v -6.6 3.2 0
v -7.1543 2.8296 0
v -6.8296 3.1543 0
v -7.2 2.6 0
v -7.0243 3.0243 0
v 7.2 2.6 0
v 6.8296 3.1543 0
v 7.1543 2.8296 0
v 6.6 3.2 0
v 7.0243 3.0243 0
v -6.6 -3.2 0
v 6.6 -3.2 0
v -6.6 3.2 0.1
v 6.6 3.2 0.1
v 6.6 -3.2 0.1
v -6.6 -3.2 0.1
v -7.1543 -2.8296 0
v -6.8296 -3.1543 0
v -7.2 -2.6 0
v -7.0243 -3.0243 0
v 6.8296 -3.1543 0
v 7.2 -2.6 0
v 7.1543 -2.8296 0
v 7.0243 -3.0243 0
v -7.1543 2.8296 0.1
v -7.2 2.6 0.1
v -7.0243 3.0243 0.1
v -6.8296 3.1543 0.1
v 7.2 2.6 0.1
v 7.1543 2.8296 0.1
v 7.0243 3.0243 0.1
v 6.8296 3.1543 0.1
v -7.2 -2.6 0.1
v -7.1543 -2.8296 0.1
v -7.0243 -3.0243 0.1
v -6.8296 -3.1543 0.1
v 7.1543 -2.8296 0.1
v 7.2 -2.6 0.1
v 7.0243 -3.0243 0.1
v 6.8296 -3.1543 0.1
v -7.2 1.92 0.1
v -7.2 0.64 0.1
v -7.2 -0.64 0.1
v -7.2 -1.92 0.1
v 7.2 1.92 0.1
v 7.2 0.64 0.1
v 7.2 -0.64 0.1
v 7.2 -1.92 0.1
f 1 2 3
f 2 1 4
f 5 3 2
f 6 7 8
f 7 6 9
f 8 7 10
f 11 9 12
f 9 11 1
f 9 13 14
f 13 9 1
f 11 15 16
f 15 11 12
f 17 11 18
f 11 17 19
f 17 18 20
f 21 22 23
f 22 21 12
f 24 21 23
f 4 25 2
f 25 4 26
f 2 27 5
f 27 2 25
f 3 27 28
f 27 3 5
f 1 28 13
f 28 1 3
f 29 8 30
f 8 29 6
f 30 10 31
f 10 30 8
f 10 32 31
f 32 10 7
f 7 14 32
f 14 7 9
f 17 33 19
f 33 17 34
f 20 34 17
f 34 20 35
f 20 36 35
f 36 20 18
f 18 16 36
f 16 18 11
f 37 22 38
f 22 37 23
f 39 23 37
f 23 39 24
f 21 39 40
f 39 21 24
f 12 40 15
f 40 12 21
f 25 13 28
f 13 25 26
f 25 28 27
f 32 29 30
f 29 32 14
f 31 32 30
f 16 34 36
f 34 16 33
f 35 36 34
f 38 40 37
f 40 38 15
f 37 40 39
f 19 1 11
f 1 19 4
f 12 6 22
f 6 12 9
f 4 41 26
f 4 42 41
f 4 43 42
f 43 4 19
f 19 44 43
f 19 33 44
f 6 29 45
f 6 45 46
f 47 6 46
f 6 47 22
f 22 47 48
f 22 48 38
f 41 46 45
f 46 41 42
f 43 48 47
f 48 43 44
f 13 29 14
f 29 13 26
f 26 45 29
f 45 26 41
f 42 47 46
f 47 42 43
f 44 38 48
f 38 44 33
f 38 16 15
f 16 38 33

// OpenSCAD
// file: ../p/box3u12.scad
use <../lib.scad>
function ldraw_lib__box3u12() = [
// 0 Box with 3 Parallel Faces without Any Edges
// 0 Name: box3u12.dat
// 0 Author: J.C. Tchang [tchang]
// 0 !LDRAW_ORG Primitive UPDATE 2014-02
// 0 !LICENSE Licensed under CC BY 4.0 : see CAreadme.txt
// 
// 0 BFC CERTIFY CCW
  [0,"BFC","CERTIFY"],
  [0,"BFC","CCW"],
// 
// 0 !HISTORY 2014-12-23 [PTadmin] Official Update 2014-02
// 
// 
// 4 16 -1 1 1 1 1 1 1 1 -1 -1 1 -1
  [4,16,-1,1,1,1,1,1,1,1,-1,-1,1,-1],
// 4 16 -1 1 1 -1 0 1 1 0 1 1 1 1
  [4,16,-1,1,1,-1,0,1,1,0,1,1,1,1],
// 4 16 1 1 -1 1 0 -1 -1 0 -1 -1 1 -1
  [4,16,1,1,-1,1,0,-1,-1,0,-1,-1,1,-1],
];
module ldraw_lib__box3u12(step=0, col=false, unit=2/5, alt=false, line=0.2, solid=!$preview)
    makepoly(ldraw_lib__box3u12(), step=step, col=col, unit=unit, alt=alt, line=line, solid=solid);
ldraw_lib__box3u12(line=0.2);
// file: ../p/1-4cyli.scad
use <../lib.scad>
function ldraw_lib__1_4cyli() = [
// 0 Cylinder 0.25
// 0 Name: 1-4cyli.dat
// 0 Author: James Jessiman
// 0 !LDRAW_ORG Primitive UPDATE 2012-01
// 0 !LICENSE Licensed under CC BY 4.0 : see CAreadme.txt
// 
// 0 BFC CERTIFY CCW
  [0,"BFC","CERTIFY"],
  [0,"BFC","CCW"],
// 
// 0 !HISTORY 2002-03-23 [sbliss] Added BFC statement.
// 0 !HISTORY 2002-04-25 [PTadmin] Official Update 2002-02
// 0 !HISTORY 2007-06-22 [PTadmin] Header formatted for Contributor Agreement
// 0 !HISTORY 2008-07-01 [PTadmin] Official Update 2008-01
// 0 !HISTORY 2012-02-16 [Philo] Changed to CCW
// 0 !HISTORY 2012-03-30 [PTadmin] Official Update 2012-01
// 
// 
// 4 16 1 1 0 0.9239 1 0.3827 0.9239 0 0.3827 1 0 0
  [4,16,1,1,0,0.9239,1,0.3827,0.9239,0,0.3827,1,0,0],
// 5 24 1 0 0 1 1 0 0.9239 0 0.3827 1 0 -1
  [5,24,1,0,0,1,1,0,0.9239,0,0.3827,1,0,-1],
// 4 16 0.9239 1 0.3827 0.7071 1 0.7071 0.7071 0 0.7071 0.9239 0 0.3827
  [4,16,0.9239,1,0.3827,0.7071,1,0.7071,0.7071,0,0.7071,0.9239,0,0.3827],
// 5 24 0.9239 0 0.3827 0.9239 1 0.3827 0.7071 0 0.7071 1 0 0
  [5,24,0.9239,0,0.3827,0.9239,1,0.3827,0.7071,0,0.7071,1,0,0],
// 4 16 0.7071 1 0.7071 0.3827 1 0.9239 0.3827 0 0.9239 0.7071 0 0.7071
  [4,16,0.7071,1,0.7071,0.3827,1,0.9239,0.3827,0,0.9239,0.7071,0,0.7071],
// 5 24 0.7071 0 0.7071 0.7071 1 0.7071 0.3827 0 0.9239 0.9239 0 0.3827
  [5,24,0.7071,0,0.7071,0.7071,1,0.7071,0.3827,0,0.9239,0.9239,0,0.3827],
// 4 16 0.3827 1 0.9239 0 1 1 0 0 1 0.3827 0 0.9239
  [4,16,0.3827,1,0.9239,0,1,1,0,0,1,0.3827,0,0.9239],
// 5 24 0.3827 0 0.9239 0.3827 1 0.9239 0 0 1 0.7071 0 0.7071
  [5,24,0.3827,0,0.9239,0.3827,1,0.9239,0,0,1,0.7071,0,0.7071],
// 5 24 0 0 1 0 1 1 0.3827 0 0.9239 -1 0 1
  [5,24,0,0,1,0,1,1,0.3827,0,0.9239,-1,0,1],
];
module ldraw_lib__1_4cyli(step=0, col=false, unit=2/5, alt=false, line=0.2, solid=!$preview)
    makepoly(ldraw_lib__1_4cyli(), step=step, col=col, unit=unit, alt=alt, line=line, solid=solid);
ldraw_lib__1_4cyli(line=0.2);
// file: ../p/1-4chrd.scad
use <../lib.scad>
function ldraw_lib__1_4chrd() = [
// 0 Chord 0.25
// 0 Name: 1-4chrd.dat
// 0 Author: Max Martin Richter [MMR1988]
// 0 !LDRAW_ORG Primitive UPDATE 2023-05
// 0 !LICENSE Licensed under CC BY 4.0 : see CAreadme.txt
// 
// 0 BFC CERTIFY CCW
  [0,"BFC","CERTIFY"],
  [0,"BFC","CCW"],
// 
// 0 !HISTORY 2004-04-22 [PTadmin] Official Update 2004-02
// 0 !HISTORY 2007-10-09 [PTadmin] Header formatted for Contributor Agreement
// 0 !HISTORY 2008-07-01 [PTadmin] Official Update 2008-01
// 0 !HISTORY 2012-08-02 [MMR1988] Re-creation with PrimGen2 and Rectifier
// 0 !HISTORY 2012-08-09 [PTadmin] Official Update 2012-02
// 0 !HISTORY 2023-10-27 [OrionP] Change author to MMR1988 from hafhead
// 0 !HISTORY 2023-10-31 [OrionP] Official Update 2023-05
// 
// 4 16 0.9239 0 0.3827 0.3827 0 0.9239 0 0 1 1 0 0
  [4,16,0.9239,0,0.3827,0.3827,0,0.9239,0,0,1,1,0,0],
// 3 16 0.7071 0 0.7071 0.3827 0 0.9239 0.9239 0 0.3827
  [3,16,0.7071,0,0.7071,0.3827,0,0.9239,0.9239,0,0.3827],
];
module ldraw_lib__1_4chrd(step=0, col=false, unit=2/5, alt=false, line=0.2, solid=!$preview)
    makepoly(ldraw_lib__1_4chrd(), step=step, col=col, unit=unit, alt=alt, line=line, solid=solid);
ldraw_lib__1_4chrd(line=0.2);
// main file
use <../lib.scad>
use <../p/1-4chrd.scad>
use <../p/1-4cyli.scad>
use <../p/box3u12.scad>
function ldraw_lib__6148328af() = [
// 0 Sticker  0.8 x  1.8 with White Stripes on Red Background
// 0 Name: 6148328af.dat
// 0 Author: Massimo Maso [Sirio]
// 0 !LDRAW_ORG Part UPDATE 2024-08
// 0 !LICENSE Licensed under CC BY 4.0 : see CAreadme.txt
// 
// 0 BFC CERTIFY CCW
  [0,"BFC","CERTIFY"],
  [0,"BFC","CCW"],
// 
// 0 !KEYWORDS 917K, Bricklink 75876stk01, Brickowl 852010, Pit Lane, Porsche
// 0 !KEYWORDS Rebrickable 26357, set 75876, Speed Champions
// 
// 0 !HISTORY 2024-09-30 [OrionP] Official Update 2024-08
// 
// 
// 0 // Primitives
// 
// 1 16 -16.5 0 6.5 -1.5 0 0 0 -1 0 0 0 1.5 1-4chrd.dat
  [1,16,-16.5,0,6.5,-1.5,0,0,0,-1,0,0,0,1.5, ldraw_lib__1_4chrd()],
// 1 16 16.5 0 6.5 1.5 0 0 0 -1 0 0 0 1.5 1-4chrd.dat
  [1,16,16.5,0,6.5,1.5,0,0,0,-1,0,0,0,1.5, ldraw_lib__1_4chrd()],
// 1 16 0 -.25 0 16.5 0 0 0 .25 0 0 0 8 box3u12.dat
  [1,16,0,-.25,0,16.5,0,0,0,.25,0,0,0,8, ldraw_lib__box3u12()],
// 1 16 -16.5 0 -6.5 -1.5 0 0 0 -1 0 0 0 -1.5 1-4chrd.dat
  [1,16,-16.5,0,-6.5,-1.5,0,0,0,-1,0,0,0,-1.5, ldraw_lib__1_4chrd()],
// 1 16 16.5 0 -6.5 1.5 0 0 0 -1 0 0 0 -1.5 1-4chrd.dat
  [1,16,16.5,0,-6.5,1.5,0,0,0,-1,0,0,0,-1.5, ldraw_lib__1_4chrd()],
// 1 16 -16.5 0 6.5 -1.5 0 0 0 -.25 0 0 0 1.5 1-4cyli.dat
  [1,16,-16.5,0,6.5,-1.5,0,0,0,-.25,0,0,0,1.5, ldraw_lib__1_4cyli()],
// 1 16 16.5 0 6.5 1.5 0 0 0 -.25 0 0 0 1.5 1-4cyli.dat
  [1,16,16.5,0,6.5,1.5,0,0,0,-.25,0,0,0,1.5, ldraw_lib__1_4cyli()],
// 1 16 -16.5 0 -6.5 -1.5 0 0 0 -.25 0 0 0 -1.5 1-4cyli.dat
  [1,16,-16.5,0,-6.5,-1.5,0,0,0,-.25,0,0,0,-1.5, ldraw_lib__1_4cyli()],
// 1 16 16.5 0 -6.5 1.5 0 0 0 -.25 0 0 0 -1.5 1-4cyli.dat
  [1,16,16.5,0,-6.5,1.5,0,0,0,-.25,0,0,0,-1.5, ldraw_lib__1_4cyli()],
// 1 15 -16.5 -.25 6.5 -1.5 0 0 0 1 0 0 0 1.5 1-4chrd.dat
  [1,15,-16.5,-.25,6.5,-1.5,0,0,0,1,0,0,0,1.5, ldraw_lib__1_4chrd()],
// 1 15 16.5 -.25 6.5 1.5 0 0 0 1 0 0 0 1.5 1-4chrd.dat
  [1,15,16.5,-.25,6.5,1.5,0,0,0,1,0,0,0,1.5, ldraw_lib__1_4chrd()],
// 1 15 -16.5 -.25 -6.5 -1.5 0 0 0 1 0 0 0 -1.5 1-4chrd.dat
  [1,15,-16.5,-.25,-6.5,-1.5,0,0,0,1,0,0,0,-1.5, ldraw_lib__1_4chrd()],
// 1 15 16.5 -.25 -6.5 1.5 0 0 0 1 0 0 0 -1.5 1-4chrd.dat
  [1,15,16.5,-.25,-6.5,1.5,0,0,0,1,0,0,0,-1.5, ldraw_lib__1_4chrd()],
// 0 // Bottom faces
// 4 16 -16.5 0 8 -16.5 0 -8 -18 0 -6.5 -18 0 6.5
  [4,16,-16.5,0,8,-16.5,0,-8,-18,0,-6.5,-18,0,6.5],
// 4 16 16.5 0 8 18 0 6.5 18 0 -6.5 16.5 0 -8
  [4,16,16.5,0,8,18,0,6.5,18,0,-6.5,16.5,0,-8],
// 0 // Lateral faces
// 3 16 -18 0 6.5 -18 -.25 4.8 -18 -.25 6.5
  [3,16,-18,0,6.5,-18,-.25,4.8,-18,-.25,6.5],
// 3 16 -18 0 6.5 -18 -.25 1.6 -18 -.25 4.8
  [3,16,-18,0,6.5,-18,-.25,1.6,-18,-.25,4.8],
// 4 16 -18 0 6.5 -18 0 -6.5 -18 -.25 -1.6 -18 -.25 1.6
  [4,16,-18,0,6.5,-18,0,-6.5,-18,-.25,-1.6,-18,-.25,1.6],
// 3 16 -18 0 -6.5 -18 -.25 -4.8 -18 -.25 -1.6
  [3,16,-18,0,-6.5,-18,-.25,-4.8,-18,-.25,-1.6],
// 3 16 -18 0 -6.5 -18 -.25 -6.5 -18 -.25 -4.8
  [3,16,-18,0,-6.5,-18,-.25,-6.5,-18,-.25,-4.8],
// 3 16 18 0 6.5 18 -.25 6.5 18 -.25 4.8
  [3,16,18,0,6.5,18,-.25,6.5,18,-.25,4.8],
// 3 16 18 0 6.5 18 -.25 4.8 18 -.25 1.6
  [3,16,18,0,6.5,18,-.25,4.8,18,-.25,1.6],
// 4 16 18 0 6.5 18 -.25 1.6 18 -.25 -1.6 18 0 -6.5
  [4,16,18,0,6.5,18,-.25,1.6,18,-.25,-1.6,18,0,-6.5],
// 3 16 18 0 -6.5 18 -.25 -1.6 18 -.25 -4.8
  [3,16,18,0,-6.5,18,-.25,-1.6,18,-.25,-4.8],
// 3 16 18 0 -6.5 18 -.25 -4.8 18 -.25 -6.5
  [3,16,18,0,-6.5,18,-.25,-4.8,18,-.25,-6.5],
// 0 // Top faces
// 0 // Red faces
// 4 4 -18 -.25 4.8 -18 -.25 1.6 18 -.25 1.6 18 -.25 4.8
  [4,4,-18,-.25,4.8,-18,-.25,1.6,18,-.25,1.6,18,-.25,4.8],
// 4 4 -18 -.25 -1.6 -18 -.25 -4.8 18 -.25 -4.8 18 -.25 -1.6
  [4,4,-18,-.25,-1.6,-18,-.25,-4.8,18,-.25,-4.8,18,-.25,-1.6],
// 0 // White faces
// 4 15 -18 -.25 6.5 18 -.25 6.5 16.5 -.25 8 -16.5 -.25 8
  [4,15,-18,-.25,6.5,18,-.25,6.5,16.5,-.25,8,-16.5,-.25,8],
// 4 15 -18 -.25 6.5 -18 -.25 4.8 18 -.25 4.8 18 -.25 6.5
  [4,15,-18,-.25,6.5,-18,-.25,4.8,18,-.25,4.8,18,-.25,6.5],
// 4 15 -18 -.25 1.6 -18 -.25 -1.6 18 -.25 -1.6 18 -.25 1.6
  [4,15,-18,-.25,1.6,-18,-.25,-1.6,18,-.25,-1.6,18,-.25,1.6],
// 4 15 -18 -.25 -4.8 -18 -.25 -6.5 18 -.25 -6.5 18 -.25 -4.8
  [4,15,-18,-.25,-4.8,-18,-.25,-6.5,18,-.25,-6.5,18,-.25,-4.8],
// 4 15 -18 -.25 -6.5 -16.5 -.25 -8 16.5 -.25 -8 18 -.25 -6.5
  [4,15,-18,-.25,-6.5,-16.5,-.25,-8,16.5,-.25,-8,18,-.25,-6.5],
];
module ldraw_lib__6148328af(step=0, col=false, unit=2/5, alt=false, line=0.2, solid=!$preview)
    makepoly(ldraw_lib__6148328af(), step=step, col=col, unit=unit, alt=alt, line=line, solid=solid);
ldraw_lib__6148328af(line=0.2);
